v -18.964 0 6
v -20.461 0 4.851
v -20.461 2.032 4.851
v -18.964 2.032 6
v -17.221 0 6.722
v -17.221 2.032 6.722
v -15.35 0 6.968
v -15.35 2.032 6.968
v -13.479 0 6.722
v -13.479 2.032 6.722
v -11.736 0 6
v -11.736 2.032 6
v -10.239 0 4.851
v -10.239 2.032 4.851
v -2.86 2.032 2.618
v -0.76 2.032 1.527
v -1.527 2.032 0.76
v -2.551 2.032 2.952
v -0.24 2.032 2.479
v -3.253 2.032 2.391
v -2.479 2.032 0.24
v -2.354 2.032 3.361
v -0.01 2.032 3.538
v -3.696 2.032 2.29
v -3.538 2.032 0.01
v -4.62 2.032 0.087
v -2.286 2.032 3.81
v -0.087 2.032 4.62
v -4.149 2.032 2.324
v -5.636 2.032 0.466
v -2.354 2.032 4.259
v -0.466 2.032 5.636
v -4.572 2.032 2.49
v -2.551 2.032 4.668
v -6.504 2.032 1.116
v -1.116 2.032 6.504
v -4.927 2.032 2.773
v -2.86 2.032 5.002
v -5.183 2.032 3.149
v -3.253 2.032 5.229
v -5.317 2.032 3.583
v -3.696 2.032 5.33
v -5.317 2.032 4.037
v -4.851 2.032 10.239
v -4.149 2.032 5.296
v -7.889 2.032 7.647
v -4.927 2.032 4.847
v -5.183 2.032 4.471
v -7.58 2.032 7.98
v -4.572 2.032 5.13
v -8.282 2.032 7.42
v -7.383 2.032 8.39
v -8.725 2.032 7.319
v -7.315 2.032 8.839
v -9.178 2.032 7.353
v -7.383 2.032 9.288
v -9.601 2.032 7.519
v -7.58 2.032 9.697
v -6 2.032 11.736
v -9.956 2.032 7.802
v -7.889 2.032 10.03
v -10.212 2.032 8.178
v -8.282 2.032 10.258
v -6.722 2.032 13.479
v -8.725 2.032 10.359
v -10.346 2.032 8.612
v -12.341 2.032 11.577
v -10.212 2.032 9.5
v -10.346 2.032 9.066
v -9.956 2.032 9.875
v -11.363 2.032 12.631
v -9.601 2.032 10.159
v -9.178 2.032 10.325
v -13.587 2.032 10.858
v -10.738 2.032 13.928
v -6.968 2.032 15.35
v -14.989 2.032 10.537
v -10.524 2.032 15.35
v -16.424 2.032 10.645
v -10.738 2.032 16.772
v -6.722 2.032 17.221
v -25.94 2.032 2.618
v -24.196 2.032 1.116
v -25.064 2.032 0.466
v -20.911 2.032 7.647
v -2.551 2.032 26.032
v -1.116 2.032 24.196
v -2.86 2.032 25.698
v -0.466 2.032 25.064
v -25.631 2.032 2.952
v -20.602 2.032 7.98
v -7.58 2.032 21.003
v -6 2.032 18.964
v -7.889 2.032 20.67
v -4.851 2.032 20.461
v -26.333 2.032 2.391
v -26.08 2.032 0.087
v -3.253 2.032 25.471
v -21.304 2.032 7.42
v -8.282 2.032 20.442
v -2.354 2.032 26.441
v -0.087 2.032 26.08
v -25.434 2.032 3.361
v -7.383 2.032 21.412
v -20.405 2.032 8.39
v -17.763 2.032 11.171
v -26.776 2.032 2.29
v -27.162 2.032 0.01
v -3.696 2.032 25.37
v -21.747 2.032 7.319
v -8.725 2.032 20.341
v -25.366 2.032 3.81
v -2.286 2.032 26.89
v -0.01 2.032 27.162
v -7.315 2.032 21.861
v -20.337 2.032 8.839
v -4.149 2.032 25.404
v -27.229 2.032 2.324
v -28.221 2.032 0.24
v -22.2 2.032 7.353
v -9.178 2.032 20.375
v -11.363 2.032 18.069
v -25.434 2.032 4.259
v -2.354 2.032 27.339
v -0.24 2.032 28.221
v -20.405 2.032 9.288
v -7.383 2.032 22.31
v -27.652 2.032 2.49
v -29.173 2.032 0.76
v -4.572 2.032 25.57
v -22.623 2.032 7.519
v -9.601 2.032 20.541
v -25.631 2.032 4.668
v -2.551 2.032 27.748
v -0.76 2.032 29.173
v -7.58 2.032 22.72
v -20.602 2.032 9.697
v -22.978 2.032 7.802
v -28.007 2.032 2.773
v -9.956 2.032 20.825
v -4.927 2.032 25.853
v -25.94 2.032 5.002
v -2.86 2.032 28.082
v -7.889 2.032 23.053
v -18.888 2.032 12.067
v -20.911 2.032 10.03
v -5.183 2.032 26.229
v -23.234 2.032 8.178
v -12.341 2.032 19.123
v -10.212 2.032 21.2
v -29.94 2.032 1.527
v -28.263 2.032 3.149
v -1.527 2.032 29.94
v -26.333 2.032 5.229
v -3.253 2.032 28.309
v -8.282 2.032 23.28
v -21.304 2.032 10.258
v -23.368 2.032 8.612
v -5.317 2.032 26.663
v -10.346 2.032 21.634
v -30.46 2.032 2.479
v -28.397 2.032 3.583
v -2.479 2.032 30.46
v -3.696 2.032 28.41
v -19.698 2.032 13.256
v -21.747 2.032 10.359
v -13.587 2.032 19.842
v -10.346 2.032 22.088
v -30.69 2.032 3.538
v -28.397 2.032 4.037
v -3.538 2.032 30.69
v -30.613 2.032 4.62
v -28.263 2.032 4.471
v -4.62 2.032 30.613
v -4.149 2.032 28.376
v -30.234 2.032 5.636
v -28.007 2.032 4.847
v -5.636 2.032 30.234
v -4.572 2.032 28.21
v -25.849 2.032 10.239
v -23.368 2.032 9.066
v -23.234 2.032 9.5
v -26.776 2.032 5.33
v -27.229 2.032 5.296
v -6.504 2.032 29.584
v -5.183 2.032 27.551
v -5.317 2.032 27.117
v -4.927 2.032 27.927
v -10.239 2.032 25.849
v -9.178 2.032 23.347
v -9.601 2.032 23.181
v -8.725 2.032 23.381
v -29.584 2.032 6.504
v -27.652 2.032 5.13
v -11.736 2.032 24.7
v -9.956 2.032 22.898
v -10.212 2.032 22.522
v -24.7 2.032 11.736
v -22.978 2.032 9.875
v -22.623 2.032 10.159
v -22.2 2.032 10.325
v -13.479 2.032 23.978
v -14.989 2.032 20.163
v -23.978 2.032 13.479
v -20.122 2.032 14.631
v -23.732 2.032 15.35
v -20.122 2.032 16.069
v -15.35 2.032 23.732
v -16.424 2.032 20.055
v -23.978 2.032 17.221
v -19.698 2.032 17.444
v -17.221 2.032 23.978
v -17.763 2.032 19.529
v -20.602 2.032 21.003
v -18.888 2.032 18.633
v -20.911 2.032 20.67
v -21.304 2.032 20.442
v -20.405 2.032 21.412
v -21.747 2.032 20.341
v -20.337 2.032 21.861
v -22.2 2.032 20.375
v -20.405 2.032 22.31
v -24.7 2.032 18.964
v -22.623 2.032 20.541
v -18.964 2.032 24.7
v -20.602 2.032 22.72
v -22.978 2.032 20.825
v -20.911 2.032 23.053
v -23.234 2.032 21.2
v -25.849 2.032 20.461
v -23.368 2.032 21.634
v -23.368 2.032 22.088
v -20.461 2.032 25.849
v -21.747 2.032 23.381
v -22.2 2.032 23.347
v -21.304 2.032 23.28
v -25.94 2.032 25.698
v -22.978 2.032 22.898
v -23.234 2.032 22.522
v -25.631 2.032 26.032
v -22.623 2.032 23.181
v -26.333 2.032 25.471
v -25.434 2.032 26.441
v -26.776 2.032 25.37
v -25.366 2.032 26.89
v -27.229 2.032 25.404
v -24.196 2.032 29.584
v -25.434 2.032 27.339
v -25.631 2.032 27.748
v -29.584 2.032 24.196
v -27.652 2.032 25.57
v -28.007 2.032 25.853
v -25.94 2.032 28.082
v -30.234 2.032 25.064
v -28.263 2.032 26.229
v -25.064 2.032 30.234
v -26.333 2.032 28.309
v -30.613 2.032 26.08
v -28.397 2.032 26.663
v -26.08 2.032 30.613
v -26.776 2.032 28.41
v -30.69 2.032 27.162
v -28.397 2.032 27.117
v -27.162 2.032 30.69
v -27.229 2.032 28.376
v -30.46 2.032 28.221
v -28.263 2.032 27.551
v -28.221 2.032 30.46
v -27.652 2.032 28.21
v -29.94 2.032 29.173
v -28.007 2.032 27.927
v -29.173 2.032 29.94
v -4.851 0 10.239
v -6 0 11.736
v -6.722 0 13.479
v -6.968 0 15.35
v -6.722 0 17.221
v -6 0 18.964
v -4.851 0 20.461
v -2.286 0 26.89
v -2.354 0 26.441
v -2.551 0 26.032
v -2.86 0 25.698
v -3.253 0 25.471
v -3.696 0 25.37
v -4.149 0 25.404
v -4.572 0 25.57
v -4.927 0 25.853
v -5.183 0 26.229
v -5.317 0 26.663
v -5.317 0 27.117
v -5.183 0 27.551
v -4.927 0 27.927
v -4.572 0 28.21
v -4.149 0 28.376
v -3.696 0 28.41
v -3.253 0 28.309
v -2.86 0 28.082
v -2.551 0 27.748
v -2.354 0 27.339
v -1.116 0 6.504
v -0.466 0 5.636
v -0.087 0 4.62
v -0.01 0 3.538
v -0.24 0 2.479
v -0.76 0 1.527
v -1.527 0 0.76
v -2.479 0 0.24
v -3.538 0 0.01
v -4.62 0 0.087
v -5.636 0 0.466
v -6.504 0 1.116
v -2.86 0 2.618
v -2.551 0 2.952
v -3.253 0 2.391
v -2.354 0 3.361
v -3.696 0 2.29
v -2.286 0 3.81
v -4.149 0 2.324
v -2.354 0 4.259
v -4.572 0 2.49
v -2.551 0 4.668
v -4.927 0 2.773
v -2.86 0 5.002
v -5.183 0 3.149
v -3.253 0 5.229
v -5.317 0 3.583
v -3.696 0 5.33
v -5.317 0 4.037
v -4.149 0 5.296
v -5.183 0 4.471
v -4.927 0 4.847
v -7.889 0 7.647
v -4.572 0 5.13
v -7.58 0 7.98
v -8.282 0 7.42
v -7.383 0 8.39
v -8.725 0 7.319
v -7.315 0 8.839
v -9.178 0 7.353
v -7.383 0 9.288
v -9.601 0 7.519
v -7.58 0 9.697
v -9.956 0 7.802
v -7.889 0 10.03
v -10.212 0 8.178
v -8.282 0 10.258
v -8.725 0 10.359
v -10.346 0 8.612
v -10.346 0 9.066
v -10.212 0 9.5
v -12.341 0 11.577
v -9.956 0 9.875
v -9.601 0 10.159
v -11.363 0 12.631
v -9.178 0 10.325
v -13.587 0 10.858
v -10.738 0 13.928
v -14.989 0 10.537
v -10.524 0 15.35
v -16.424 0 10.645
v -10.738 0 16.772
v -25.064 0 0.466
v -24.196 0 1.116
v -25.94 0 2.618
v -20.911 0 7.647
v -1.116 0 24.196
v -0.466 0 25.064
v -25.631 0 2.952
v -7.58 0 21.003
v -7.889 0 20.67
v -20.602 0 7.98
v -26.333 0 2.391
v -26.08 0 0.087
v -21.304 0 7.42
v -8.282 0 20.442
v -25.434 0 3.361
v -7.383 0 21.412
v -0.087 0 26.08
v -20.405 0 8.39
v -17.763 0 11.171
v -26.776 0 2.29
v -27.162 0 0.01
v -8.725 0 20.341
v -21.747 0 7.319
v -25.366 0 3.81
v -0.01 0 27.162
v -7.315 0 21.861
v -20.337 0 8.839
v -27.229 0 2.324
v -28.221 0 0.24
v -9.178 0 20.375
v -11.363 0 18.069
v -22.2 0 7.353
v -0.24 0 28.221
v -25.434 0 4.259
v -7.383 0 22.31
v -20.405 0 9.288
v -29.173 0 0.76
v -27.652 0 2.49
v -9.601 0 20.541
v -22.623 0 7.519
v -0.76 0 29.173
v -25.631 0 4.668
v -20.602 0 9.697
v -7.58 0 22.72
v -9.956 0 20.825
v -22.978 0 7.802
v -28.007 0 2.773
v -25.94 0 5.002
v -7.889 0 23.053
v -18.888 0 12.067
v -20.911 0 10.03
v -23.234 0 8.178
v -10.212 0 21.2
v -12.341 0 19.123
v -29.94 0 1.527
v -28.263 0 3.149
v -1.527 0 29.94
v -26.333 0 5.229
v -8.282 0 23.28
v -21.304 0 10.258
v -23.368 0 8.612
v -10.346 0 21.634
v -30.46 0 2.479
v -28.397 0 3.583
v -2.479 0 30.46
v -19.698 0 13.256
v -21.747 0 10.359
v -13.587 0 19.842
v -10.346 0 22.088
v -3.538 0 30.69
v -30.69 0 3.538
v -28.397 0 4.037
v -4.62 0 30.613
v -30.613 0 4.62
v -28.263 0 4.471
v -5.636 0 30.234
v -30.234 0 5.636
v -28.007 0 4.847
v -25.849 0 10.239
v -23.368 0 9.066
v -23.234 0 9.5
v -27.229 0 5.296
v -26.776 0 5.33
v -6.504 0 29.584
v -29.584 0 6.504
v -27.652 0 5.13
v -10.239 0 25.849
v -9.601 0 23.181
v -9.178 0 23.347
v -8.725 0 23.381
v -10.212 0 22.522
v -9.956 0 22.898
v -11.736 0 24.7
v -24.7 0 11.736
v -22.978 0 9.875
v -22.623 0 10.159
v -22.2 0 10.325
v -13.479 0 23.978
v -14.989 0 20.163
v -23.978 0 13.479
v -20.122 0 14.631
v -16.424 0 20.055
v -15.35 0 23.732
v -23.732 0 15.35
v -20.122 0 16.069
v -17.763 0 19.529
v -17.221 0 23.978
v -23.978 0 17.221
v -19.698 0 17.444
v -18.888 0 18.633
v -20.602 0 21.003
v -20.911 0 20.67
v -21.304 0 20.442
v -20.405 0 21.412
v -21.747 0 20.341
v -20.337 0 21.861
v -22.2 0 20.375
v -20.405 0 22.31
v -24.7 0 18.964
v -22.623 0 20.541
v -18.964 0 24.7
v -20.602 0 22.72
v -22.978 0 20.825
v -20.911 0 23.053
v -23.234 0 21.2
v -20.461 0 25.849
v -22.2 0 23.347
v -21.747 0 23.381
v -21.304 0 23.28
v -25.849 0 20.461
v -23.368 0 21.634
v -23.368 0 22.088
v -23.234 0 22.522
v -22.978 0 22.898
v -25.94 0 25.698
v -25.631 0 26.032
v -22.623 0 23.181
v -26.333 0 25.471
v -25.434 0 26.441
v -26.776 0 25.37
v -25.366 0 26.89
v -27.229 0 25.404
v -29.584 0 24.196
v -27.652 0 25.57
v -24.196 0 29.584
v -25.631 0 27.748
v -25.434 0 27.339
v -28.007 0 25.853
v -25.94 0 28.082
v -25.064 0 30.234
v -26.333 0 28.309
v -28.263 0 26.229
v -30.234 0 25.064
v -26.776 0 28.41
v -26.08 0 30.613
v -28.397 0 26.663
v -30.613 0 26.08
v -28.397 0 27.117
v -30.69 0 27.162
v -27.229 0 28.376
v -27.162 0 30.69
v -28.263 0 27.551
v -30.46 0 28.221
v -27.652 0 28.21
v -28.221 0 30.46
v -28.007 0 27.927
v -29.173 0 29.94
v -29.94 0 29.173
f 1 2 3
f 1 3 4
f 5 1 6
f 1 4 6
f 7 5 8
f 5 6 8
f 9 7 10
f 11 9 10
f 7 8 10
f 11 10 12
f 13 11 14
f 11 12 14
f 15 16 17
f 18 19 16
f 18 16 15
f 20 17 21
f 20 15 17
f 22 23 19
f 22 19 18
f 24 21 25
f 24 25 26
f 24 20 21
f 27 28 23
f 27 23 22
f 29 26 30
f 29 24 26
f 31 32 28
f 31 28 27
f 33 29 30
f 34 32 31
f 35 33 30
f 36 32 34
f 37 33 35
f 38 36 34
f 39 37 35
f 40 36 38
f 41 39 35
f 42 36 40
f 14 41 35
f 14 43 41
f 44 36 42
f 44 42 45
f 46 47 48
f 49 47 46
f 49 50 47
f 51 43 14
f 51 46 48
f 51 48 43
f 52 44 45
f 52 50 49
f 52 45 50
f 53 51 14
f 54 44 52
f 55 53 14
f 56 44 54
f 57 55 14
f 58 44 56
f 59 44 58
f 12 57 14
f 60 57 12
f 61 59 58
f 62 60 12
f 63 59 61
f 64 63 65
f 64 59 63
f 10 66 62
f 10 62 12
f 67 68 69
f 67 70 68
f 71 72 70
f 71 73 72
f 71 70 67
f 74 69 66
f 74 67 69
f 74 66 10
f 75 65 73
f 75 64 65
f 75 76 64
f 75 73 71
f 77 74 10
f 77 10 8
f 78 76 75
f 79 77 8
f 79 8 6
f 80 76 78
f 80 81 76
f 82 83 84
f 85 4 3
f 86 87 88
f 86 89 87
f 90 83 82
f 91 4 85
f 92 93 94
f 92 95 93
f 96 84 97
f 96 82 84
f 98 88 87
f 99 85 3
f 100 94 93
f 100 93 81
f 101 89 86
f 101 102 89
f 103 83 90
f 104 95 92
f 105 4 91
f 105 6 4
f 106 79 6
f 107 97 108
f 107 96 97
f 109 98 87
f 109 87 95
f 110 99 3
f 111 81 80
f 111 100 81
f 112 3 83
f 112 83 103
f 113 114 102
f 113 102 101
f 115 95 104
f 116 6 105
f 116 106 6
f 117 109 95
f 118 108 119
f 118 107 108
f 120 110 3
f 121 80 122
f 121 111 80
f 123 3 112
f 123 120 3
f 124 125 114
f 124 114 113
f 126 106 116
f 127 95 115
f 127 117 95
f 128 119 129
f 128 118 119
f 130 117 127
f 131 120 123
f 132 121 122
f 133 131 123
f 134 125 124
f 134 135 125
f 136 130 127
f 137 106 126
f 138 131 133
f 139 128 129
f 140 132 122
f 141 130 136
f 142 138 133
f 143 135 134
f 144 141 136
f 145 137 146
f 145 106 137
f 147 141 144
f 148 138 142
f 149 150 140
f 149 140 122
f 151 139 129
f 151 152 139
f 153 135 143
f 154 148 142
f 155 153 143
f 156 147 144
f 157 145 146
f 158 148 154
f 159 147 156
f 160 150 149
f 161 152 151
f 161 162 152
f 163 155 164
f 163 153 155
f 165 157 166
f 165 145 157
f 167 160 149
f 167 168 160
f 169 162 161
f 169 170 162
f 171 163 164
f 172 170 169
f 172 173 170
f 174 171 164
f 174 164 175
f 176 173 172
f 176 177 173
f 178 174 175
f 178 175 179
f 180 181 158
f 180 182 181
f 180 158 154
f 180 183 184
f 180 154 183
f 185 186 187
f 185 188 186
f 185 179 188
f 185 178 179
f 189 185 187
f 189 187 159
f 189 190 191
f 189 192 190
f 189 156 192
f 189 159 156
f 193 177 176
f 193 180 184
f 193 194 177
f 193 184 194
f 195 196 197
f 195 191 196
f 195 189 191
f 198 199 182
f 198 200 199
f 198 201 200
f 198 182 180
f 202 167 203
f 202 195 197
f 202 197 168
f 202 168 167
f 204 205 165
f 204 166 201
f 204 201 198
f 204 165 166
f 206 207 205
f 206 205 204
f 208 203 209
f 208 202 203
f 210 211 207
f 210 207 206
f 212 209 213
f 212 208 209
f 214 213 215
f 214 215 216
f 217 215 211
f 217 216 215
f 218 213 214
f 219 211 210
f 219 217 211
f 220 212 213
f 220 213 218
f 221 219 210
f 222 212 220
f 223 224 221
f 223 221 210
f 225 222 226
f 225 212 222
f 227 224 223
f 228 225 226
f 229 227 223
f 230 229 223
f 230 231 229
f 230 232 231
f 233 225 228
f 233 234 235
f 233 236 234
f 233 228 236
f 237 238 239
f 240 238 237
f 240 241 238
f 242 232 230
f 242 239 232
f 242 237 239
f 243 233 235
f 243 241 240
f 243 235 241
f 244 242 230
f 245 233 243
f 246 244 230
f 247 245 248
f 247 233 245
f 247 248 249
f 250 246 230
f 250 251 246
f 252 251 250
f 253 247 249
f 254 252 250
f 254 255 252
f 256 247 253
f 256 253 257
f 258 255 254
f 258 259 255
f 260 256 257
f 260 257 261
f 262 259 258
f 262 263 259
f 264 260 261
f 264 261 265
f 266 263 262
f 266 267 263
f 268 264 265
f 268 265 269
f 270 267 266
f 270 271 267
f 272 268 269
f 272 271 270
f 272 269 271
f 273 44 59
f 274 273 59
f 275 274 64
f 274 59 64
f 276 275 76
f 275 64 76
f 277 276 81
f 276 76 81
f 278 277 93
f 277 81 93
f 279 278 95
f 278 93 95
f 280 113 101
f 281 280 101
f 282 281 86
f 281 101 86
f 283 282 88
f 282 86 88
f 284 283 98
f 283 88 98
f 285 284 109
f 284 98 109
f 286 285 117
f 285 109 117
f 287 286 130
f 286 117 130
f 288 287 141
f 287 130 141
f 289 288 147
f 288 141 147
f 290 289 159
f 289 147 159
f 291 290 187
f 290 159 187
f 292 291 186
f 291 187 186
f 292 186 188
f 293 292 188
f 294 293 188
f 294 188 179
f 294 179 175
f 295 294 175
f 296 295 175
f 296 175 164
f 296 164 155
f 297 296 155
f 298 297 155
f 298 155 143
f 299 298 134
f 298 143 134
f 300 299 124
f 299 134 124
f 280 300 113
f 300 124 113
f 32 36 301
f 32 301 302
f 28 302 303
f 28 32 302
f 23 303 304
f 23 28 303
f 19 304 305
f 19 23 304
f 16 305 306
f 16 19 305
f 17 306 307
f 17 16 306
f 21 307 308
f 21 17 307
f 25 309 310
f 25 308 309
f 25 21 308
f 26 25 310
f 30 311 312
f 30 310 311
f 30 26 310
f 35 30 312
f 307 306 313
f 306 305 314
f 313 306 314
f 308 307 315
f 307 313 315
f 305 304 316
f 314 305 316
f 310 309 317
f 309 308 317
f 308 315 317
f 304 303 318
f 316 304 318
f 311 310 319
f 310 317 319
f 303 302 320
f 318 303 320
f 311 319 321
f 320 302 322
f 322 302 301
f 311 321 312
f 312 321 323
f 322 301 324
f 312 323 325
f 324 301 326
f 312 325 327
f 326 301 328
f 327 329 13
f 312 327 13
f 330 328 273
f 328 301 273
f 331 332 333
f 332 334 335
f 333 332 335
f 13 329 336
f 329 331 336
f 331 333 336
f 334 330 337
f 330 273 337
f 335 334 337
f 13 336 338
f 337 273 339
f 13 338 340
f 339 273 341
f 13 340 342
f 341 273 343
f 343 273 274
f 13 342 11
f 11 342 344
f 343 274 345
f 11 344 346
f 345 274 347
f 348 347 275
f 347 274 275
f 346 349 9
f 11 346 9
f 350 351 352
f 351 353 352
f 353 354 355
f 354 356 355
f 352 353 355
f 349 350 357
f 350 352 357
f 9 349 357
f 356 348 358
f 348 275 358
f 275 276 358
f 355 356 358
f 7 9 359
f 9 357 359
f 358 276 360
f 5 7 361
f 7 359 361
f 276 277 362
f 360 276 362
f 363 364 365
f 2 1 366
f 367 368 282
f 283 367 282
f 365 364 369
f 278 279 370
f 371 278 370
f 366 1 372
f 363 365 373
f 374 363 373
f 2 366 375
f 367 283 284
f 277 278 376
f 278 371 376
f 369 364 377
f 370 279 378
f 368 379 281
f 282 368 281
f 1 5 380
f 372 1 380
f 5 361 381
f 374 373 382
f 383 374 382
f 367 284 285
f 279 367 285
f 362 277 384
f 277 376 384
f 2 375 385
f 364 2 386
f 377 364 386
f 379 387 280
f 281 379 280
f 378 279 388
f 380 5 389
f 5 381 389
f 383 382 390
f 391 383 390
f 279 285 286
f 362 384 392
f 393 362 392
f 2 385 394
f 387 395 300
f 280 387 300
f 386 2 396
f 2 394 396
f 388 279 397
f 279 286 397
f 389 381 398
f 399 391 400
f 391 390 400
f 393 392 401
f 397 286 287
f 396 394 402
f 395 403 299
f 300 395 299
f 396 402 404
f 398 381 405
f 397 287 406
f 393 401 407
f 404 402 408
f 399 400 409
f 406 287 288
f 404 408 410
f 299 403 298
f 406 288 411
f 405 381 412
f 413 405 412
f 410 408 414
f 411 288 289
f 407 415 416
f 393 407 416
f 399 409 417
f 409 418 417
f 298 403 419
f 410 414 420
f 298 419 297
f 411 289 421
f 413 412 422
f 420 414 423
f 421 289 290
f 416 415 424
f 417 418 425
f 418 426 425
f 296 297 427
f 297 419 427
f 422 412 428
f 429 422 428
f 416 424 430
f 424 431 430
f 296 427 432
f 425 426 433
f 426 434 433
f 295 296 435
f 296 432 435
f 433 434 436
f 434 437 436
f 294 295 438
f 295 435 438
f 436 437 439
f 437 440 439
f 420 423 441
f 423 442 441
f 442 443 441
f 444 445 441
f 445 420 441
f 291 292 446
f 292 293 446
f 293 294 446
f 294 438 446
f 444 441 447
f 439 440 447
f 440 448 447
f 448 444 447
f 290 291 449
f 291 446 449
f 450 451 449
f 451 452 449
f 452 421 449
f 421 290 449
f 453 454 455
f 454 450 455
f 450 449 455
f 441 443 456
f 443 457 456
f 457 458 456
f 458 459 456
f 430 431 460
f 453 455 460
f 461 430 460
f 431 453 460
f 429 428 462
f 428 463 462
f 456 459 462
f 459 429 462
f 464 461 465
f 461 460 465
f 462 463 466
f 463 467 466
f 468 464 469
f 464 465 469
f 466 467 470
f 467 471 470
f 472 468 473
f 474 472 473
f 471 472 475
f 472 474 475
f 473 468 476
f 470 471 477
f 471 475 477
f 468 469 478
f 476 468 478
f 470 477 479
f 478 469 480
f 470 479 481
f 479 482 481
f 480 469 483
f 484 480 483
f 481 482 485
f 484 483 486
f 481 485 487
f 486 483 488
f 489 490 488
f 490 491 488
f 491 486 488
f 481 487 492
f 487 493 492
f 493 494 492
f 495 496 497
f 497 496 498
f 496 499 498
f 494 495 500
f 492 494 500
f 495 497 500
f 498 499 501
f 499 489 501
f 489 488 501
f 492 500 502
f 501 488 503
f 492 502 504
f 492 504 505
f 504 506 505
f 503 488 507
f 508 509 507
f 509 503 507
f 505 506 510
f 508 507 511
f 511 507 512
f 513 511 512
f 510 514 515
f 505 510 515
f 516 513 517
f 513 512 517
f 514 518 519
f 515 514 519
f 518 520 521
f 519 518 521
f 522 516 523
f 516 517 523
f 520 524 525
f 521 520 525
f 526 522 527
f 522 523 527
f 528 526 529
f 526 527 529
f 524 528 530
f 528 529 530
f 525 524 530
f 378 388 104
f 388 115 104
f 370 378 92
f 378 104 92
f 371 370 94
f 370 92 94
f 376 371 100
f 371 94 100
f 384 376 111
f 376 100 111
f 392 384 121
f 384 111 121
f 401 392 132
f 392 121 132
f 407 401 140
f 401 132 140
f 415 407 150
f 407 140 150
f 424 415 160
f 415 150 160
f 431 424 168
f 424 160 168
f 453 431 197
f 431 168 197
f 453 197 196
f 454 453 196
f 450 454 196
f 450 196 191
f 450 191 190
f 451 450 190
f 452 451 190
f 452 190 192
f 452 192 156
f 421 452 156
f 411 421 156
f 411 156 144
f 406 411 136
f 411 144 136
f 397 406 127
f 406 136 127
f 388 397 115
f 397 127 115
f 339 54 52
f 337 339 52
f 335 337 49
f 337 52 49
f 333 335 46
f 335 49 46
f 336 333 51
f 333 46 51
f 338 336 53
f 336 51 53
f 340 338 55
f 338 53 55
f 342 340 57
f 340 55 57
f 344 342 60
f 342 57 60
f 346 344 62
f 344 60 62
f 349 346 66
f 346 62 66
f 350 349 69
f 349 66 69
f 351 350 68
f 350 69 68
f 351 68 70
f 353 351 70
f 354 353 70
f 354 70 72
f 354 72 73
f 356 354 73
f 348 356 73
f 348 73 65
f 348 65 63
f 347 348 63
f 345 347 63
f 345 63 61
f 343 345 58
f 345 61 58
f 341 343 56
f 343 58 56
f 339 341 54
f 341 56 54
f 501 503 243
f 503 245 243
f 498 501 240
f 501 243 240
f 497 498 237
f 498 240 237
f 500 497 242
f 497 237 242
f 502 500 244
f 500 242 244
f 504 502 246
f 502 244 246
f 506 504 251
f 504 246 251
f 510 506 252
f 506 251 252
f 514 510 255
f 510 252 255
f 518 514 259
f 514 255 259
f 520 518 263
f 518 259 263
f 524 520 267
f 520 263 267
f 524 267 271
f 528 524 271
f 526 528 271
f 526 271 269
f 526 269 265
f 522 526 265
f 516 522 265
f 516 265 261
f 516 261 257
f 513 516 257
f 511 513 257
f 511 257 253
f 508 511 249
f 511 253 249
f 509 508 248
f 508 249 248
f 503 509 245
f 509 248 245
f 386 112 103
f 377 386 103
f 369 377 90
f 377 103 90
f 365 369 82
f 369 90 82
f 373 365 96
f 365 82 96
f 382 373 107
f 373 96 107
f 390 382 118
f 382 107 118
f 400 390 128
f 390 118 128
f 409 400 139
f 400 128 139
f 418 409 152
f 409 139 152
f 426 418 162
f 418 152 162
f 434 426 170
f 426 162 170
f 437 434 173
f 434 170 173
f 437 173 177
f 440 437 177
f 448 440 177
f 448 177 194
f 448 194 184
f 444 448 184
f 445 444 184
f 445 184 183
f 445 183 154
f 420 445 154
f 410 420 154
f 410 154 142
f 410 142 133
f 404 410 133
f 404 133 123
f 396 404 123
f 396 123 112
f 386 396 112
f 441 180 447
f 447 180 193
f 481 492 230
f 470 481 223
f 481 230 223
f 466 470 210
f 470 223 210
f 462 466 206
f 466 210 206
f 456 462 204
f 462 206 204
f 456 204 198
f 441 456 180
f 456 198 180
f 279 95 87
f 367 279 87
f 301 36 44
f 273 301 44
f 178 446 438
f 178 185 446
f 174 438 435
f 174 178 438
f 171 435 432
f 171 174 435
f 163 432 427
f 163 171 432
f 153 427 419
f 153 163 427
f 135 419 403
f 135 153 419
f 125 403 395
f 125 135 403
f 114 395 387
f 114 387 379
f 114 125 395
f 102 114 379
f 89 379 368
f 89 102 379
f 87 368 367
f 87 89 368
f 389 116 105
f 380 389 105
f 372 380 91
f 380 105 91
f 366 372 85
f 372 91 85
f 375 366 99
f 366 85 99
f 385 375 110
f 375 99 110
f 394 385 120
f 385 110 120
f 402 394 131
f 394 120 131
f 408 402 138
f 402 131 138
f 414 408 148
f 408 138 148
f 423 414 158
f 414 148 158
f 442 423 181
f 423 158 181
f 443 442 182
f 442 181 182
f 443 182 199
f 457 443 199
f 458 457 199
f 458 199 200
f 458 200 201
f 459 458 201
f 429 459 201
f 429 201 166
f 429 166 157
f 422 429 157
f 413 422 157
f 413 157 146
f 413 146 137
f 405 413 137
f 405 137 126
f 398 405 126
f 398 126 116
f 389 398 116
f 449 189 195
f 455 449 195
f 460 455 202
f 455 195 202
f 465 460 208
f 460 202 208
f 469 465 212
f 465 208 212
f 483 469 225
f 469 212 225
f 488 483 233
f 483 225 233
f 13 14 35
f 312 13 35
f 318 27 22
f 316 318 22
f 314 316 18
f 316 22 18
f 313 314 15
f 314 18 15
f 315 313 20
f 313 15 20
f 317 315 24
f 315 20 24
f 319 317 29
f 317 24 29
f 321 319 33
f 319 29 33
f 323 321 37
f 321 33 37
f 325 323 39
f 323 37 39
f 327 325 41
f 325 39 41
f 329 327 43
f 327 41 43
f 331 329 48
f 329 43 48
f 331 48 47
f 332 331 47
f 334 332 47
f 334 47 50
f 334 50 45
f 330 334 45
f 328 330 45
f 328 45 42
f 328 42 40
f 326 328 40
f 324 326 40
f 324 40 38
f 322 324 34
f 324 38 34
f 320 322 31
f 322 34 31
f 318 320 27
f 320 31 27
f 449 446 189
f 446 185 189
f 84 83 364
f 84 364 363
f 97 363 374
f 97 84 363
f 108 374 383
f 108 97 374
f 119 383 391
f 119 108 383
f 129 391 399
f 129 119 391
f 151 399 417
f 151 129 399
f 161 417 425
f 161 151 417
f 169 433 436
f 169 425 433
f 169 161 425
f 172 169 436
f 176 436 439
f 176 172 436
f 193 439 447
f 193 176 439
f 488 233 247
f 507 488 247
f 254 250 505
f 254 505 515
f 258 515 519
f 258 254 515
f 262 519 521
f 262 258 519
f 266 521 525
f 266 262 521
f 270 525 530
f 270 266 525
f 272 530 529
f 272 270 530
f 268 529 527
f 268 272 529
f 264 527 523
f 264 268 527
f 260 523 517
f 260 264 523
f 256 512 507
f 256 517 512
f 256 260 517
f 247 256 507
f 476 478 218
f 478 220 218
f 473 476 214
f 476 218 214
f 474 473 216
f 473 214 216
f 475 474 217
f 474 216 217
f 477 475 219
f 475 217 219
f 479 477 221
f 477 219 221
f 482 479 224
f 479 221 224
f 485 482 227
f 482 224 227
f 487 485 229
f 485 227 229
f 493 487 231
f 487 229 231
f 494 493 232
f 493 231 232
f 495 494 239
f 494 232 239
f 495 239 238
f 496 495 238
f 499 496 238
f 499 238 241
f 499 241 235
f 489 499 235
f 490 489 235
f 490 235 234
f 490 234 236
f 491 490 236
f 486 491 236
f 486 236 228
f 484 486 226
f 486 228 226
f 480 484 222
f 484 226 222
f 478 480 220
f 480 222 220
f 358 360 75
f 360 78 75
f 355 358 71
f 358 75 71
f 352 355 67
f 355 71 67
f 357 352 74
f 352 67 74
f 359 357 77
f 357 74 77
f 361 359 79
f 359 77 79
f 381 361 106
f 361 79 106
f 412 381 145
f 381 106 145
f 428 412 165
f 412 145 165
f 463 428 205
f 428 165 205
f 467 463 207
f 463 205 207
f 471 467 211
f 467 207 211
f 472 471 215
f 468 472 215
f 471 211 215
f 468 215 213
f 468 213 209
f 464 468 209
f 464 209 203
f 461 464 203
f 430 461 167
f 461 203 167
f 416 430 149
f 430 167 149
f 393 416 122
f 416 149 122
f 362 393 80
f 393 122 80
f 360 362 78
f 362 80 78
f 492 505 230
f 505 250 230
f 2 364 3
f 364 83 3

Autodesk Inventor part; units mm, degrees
ref_plane "YZ Plane" through (0, 0, 0) normal (1, 0, 0) x (0, 1, 0)
ref_plane "XZ Plane" through (0, 0, 0) normal (0, 1, 0) x (-1, 0, 0)
ref_plane "XY Plane" through (0, 0, 0) normal (0, 0, 1) x (1, 0, 0)
sketch "Sketch1" plane through (0, 0, 0) normal (0, 1, 0) x (-1, 0, 0)
  line L0 (0, 0) -> (30.7, 0)
  line L1 (30.7, 0) -> (30.7, 30.7)
  line L2 (30.7, 30.7) -> (0, 30.7)
  line L3 (0, 30.7) -> (0, 0)
  dimension "d0" = 30.7
  dimension "d1" = 30.7
extrude "Extrusion1" add sketch "Sketch1" along normal blind 2.032
sketch "Sketch2" plane through (0, 2.032, 0) normal (0, 1, 0) x (1, 0, 0)
  circle A0 centre (-26.89, -26.89) radius 3.81
  circle A1 centre (-3.81, -26.89) radius 3.81
  circle A2 centre (-3.81, -3.81) radius 3.81
  circle A3 centre (-26.89, -3.81) radius 3.81
  circle A4 centre (-15.35, -30.9598) radius 7.2278
  circle A5 centre (-15.35, 0.2598) radius 7.2278
  circle A6 centre (-30.9598, -15.35) radius 7.2278
  circle A7 centre (0.2598, -15.35) radius 7.2278
  line L0 (-29.5841, -24.1959) -> (-25.849, -20.4608)
  line L1 (-25.849, -10.2392) -> (-29.5841, -6.5041)
  line L2 (-24.1959, -1.1159) -> (-20.4608, -4.851)
  line L3 (-10.2392, -4.851) -> (-6.5041, -1.1159)
  line L4 (-1.1159, -6.5041) -> (-4.851, -10.2392)
  line L5 (-4.851, -20.4608) -> (-1.1159, -24.1959)
  line L6 (-6.5041, -29.5841) -> (-10.2392, -25.849)
  line L7 (-20.4608, -25.849) -> (-24.1959, -29.5841)
  line L8 (-30.7, 0) -> (-30.7, -30.7) projected
  line L9 (-30.7, -30.7) -> (0, -30.7) projected
  line L10 (0, -30.7) -> (0, 0) projected
  line L11 (0, 0) -> (-30.7, 0) projected
  line L12 (-23.732, -15.35) -> (-6.968, -15.35) construction
  line L13 (-30.7, -15.35) -> (-23.732, -15.35) construction
  point P0 (-26.89, 0)
  point P1 (-3.81, 0)
  point P2 (-30.7, -3.81)
  point P3 (0, -3.81)
  point P4 (0, -26.89)
  point P5 (-3.81, -30.7)
  point P6 (-26.89, -30.7)
  point P7 (-30.7, -26.89)
  dimension "d4" = 7.62
  dimension "d5" = 16.764
extrude "Extrusion2" cut sketch "Sketch2" against normal through all contours A0 L8 A6 L0 | L7 A4 L9 A0 | A0 L9 L8 | A6 L8 | A4 L9 | L6 A1 L9 A4 | L8 A3 L1 A6 | L8 L11 A3 | A1 L10 L9 | L5 A7 L10 A1 | L11 A5 L2 A3 | A7 L10 | L11 A5 | L4 A2 L10 A7 | L11 A2 L3 A5 | L11 L10 A2 picked at (-27.8979, -13.6464) picked at (-16.0496, -27.92) picked at (-4.1409, -17.2716) picked at (-14.1643, -2.5459)
sketch "Sketch3" plane through (0, 2.032, 0) normal (0, 1, 0) x (1, 0, 0)
  circle A0 centre (-26.89, -26.89) radius 1.524
  circle A1 centre (-21.8611, -21.8611) radius 1.524
  circle A2 centre (-15.35, -15.35) radius 4.826
  arc A3 (-29.5841, -24.1959) -> (-24.1959, -29.5841) centre (-26.89, -26.89) ccw projected
  line L0 (-29.5841, -29.5841) -> (0, 0) construction
  line L1 (-25.4985, -30.4368) -> (-30.4368, -25.4985) construction
  line L2 (-18.0893, -23.4775) -> (-23.4775, -18.0893) construction
  arc A4 (-29.5841, -24.1959) -> (-24.1959, -29.5841) centre (-26.89, -26.89) ccw projected
  line L3 (-24.1959, -29.5841) -> (-20.4608, -25.849) projected
  arc A5 (-10.2392, -25.849) -> (-20.4608, -25.849) centre (-15.35, -30.9598) ccw projected
  line L4 (-10.2392, -25.849) -> (-6.5041, -29.5841) projected
  arc A6 (-6.5041, -29.5841) -> (-1.1159, -24.1959) centre (-3.81, -26.89) ccw projected
  line L5 (-1.1159, -24.1959) -> (-4.851, -20.4608) projected
  arc A7 (-4.851, -10.2392) -> (-4.851, -20.4608) centre (0.2598, -15.35) ccw projected
  line L6 (-4.851, -10.2392) -> (-1.1159, -6.5041) projected
  arc A8 (-1.1159, -6.5041) -> (-6.5041, -1.1159) centre (-3.81, -3.81) ccw projected
  line L7 (-6.5041, -1.1159) -> (-10.2392, -4.851) projected
  arc A9 (-20.4608, -4.851) -> (-10.2392, -4.851) centre (-15.35, 0.2598) ccw projected
  line L8 (-20.4608, -4.851) -> (-24.1959, -1.1159) projected
  arc A10 (-24.1959, -1.1159) -> (-29.5841, -6.5041) centre (-26.89, -3.81) ccw projected
  line L9 (-29.5841, -6.5041) -> (-25.849, -10.2392) projected
  arc A11 (-25.849, -20.4608) -> (-25.849, -10.2392) centre (-30.9598, -15.35) ccw projected
  line L10 (-25.849, -20.4608) -> (-29.5841, -24.1959) projected
  line L11 (-29.5841, -1.1159) -> (-1.1159, -29.5841) construction
  circle A12 centre (-3.81, -26.89) radius 1.524
  circle A13 centre (-8.8389, -21.8611) radius 1.524
  circle A14 centre (-3.81, -3.81) radius 1.524
  circle A15 centre (-8.8389, -8.8389) radius 1.524
  circle A16 centre (-26.89, -3.81) radius 1.524
  circle A17 centre (-21.8611, -8.8389) radius 1.524
  dimension "d8" = 3.048
  dimension "d9" = 3.048
  dimension "d10" = 10.16
  dimension "d11" = 9.652
  dimension "d14" = 360
extrude "Extrusion3" cut sketch "Sketch3" against normal through all contours A0 | A1 | A2 | A12 | A13 | A14 | A15 | A16 | A17
properties part number "Brushless Motor Mount"
